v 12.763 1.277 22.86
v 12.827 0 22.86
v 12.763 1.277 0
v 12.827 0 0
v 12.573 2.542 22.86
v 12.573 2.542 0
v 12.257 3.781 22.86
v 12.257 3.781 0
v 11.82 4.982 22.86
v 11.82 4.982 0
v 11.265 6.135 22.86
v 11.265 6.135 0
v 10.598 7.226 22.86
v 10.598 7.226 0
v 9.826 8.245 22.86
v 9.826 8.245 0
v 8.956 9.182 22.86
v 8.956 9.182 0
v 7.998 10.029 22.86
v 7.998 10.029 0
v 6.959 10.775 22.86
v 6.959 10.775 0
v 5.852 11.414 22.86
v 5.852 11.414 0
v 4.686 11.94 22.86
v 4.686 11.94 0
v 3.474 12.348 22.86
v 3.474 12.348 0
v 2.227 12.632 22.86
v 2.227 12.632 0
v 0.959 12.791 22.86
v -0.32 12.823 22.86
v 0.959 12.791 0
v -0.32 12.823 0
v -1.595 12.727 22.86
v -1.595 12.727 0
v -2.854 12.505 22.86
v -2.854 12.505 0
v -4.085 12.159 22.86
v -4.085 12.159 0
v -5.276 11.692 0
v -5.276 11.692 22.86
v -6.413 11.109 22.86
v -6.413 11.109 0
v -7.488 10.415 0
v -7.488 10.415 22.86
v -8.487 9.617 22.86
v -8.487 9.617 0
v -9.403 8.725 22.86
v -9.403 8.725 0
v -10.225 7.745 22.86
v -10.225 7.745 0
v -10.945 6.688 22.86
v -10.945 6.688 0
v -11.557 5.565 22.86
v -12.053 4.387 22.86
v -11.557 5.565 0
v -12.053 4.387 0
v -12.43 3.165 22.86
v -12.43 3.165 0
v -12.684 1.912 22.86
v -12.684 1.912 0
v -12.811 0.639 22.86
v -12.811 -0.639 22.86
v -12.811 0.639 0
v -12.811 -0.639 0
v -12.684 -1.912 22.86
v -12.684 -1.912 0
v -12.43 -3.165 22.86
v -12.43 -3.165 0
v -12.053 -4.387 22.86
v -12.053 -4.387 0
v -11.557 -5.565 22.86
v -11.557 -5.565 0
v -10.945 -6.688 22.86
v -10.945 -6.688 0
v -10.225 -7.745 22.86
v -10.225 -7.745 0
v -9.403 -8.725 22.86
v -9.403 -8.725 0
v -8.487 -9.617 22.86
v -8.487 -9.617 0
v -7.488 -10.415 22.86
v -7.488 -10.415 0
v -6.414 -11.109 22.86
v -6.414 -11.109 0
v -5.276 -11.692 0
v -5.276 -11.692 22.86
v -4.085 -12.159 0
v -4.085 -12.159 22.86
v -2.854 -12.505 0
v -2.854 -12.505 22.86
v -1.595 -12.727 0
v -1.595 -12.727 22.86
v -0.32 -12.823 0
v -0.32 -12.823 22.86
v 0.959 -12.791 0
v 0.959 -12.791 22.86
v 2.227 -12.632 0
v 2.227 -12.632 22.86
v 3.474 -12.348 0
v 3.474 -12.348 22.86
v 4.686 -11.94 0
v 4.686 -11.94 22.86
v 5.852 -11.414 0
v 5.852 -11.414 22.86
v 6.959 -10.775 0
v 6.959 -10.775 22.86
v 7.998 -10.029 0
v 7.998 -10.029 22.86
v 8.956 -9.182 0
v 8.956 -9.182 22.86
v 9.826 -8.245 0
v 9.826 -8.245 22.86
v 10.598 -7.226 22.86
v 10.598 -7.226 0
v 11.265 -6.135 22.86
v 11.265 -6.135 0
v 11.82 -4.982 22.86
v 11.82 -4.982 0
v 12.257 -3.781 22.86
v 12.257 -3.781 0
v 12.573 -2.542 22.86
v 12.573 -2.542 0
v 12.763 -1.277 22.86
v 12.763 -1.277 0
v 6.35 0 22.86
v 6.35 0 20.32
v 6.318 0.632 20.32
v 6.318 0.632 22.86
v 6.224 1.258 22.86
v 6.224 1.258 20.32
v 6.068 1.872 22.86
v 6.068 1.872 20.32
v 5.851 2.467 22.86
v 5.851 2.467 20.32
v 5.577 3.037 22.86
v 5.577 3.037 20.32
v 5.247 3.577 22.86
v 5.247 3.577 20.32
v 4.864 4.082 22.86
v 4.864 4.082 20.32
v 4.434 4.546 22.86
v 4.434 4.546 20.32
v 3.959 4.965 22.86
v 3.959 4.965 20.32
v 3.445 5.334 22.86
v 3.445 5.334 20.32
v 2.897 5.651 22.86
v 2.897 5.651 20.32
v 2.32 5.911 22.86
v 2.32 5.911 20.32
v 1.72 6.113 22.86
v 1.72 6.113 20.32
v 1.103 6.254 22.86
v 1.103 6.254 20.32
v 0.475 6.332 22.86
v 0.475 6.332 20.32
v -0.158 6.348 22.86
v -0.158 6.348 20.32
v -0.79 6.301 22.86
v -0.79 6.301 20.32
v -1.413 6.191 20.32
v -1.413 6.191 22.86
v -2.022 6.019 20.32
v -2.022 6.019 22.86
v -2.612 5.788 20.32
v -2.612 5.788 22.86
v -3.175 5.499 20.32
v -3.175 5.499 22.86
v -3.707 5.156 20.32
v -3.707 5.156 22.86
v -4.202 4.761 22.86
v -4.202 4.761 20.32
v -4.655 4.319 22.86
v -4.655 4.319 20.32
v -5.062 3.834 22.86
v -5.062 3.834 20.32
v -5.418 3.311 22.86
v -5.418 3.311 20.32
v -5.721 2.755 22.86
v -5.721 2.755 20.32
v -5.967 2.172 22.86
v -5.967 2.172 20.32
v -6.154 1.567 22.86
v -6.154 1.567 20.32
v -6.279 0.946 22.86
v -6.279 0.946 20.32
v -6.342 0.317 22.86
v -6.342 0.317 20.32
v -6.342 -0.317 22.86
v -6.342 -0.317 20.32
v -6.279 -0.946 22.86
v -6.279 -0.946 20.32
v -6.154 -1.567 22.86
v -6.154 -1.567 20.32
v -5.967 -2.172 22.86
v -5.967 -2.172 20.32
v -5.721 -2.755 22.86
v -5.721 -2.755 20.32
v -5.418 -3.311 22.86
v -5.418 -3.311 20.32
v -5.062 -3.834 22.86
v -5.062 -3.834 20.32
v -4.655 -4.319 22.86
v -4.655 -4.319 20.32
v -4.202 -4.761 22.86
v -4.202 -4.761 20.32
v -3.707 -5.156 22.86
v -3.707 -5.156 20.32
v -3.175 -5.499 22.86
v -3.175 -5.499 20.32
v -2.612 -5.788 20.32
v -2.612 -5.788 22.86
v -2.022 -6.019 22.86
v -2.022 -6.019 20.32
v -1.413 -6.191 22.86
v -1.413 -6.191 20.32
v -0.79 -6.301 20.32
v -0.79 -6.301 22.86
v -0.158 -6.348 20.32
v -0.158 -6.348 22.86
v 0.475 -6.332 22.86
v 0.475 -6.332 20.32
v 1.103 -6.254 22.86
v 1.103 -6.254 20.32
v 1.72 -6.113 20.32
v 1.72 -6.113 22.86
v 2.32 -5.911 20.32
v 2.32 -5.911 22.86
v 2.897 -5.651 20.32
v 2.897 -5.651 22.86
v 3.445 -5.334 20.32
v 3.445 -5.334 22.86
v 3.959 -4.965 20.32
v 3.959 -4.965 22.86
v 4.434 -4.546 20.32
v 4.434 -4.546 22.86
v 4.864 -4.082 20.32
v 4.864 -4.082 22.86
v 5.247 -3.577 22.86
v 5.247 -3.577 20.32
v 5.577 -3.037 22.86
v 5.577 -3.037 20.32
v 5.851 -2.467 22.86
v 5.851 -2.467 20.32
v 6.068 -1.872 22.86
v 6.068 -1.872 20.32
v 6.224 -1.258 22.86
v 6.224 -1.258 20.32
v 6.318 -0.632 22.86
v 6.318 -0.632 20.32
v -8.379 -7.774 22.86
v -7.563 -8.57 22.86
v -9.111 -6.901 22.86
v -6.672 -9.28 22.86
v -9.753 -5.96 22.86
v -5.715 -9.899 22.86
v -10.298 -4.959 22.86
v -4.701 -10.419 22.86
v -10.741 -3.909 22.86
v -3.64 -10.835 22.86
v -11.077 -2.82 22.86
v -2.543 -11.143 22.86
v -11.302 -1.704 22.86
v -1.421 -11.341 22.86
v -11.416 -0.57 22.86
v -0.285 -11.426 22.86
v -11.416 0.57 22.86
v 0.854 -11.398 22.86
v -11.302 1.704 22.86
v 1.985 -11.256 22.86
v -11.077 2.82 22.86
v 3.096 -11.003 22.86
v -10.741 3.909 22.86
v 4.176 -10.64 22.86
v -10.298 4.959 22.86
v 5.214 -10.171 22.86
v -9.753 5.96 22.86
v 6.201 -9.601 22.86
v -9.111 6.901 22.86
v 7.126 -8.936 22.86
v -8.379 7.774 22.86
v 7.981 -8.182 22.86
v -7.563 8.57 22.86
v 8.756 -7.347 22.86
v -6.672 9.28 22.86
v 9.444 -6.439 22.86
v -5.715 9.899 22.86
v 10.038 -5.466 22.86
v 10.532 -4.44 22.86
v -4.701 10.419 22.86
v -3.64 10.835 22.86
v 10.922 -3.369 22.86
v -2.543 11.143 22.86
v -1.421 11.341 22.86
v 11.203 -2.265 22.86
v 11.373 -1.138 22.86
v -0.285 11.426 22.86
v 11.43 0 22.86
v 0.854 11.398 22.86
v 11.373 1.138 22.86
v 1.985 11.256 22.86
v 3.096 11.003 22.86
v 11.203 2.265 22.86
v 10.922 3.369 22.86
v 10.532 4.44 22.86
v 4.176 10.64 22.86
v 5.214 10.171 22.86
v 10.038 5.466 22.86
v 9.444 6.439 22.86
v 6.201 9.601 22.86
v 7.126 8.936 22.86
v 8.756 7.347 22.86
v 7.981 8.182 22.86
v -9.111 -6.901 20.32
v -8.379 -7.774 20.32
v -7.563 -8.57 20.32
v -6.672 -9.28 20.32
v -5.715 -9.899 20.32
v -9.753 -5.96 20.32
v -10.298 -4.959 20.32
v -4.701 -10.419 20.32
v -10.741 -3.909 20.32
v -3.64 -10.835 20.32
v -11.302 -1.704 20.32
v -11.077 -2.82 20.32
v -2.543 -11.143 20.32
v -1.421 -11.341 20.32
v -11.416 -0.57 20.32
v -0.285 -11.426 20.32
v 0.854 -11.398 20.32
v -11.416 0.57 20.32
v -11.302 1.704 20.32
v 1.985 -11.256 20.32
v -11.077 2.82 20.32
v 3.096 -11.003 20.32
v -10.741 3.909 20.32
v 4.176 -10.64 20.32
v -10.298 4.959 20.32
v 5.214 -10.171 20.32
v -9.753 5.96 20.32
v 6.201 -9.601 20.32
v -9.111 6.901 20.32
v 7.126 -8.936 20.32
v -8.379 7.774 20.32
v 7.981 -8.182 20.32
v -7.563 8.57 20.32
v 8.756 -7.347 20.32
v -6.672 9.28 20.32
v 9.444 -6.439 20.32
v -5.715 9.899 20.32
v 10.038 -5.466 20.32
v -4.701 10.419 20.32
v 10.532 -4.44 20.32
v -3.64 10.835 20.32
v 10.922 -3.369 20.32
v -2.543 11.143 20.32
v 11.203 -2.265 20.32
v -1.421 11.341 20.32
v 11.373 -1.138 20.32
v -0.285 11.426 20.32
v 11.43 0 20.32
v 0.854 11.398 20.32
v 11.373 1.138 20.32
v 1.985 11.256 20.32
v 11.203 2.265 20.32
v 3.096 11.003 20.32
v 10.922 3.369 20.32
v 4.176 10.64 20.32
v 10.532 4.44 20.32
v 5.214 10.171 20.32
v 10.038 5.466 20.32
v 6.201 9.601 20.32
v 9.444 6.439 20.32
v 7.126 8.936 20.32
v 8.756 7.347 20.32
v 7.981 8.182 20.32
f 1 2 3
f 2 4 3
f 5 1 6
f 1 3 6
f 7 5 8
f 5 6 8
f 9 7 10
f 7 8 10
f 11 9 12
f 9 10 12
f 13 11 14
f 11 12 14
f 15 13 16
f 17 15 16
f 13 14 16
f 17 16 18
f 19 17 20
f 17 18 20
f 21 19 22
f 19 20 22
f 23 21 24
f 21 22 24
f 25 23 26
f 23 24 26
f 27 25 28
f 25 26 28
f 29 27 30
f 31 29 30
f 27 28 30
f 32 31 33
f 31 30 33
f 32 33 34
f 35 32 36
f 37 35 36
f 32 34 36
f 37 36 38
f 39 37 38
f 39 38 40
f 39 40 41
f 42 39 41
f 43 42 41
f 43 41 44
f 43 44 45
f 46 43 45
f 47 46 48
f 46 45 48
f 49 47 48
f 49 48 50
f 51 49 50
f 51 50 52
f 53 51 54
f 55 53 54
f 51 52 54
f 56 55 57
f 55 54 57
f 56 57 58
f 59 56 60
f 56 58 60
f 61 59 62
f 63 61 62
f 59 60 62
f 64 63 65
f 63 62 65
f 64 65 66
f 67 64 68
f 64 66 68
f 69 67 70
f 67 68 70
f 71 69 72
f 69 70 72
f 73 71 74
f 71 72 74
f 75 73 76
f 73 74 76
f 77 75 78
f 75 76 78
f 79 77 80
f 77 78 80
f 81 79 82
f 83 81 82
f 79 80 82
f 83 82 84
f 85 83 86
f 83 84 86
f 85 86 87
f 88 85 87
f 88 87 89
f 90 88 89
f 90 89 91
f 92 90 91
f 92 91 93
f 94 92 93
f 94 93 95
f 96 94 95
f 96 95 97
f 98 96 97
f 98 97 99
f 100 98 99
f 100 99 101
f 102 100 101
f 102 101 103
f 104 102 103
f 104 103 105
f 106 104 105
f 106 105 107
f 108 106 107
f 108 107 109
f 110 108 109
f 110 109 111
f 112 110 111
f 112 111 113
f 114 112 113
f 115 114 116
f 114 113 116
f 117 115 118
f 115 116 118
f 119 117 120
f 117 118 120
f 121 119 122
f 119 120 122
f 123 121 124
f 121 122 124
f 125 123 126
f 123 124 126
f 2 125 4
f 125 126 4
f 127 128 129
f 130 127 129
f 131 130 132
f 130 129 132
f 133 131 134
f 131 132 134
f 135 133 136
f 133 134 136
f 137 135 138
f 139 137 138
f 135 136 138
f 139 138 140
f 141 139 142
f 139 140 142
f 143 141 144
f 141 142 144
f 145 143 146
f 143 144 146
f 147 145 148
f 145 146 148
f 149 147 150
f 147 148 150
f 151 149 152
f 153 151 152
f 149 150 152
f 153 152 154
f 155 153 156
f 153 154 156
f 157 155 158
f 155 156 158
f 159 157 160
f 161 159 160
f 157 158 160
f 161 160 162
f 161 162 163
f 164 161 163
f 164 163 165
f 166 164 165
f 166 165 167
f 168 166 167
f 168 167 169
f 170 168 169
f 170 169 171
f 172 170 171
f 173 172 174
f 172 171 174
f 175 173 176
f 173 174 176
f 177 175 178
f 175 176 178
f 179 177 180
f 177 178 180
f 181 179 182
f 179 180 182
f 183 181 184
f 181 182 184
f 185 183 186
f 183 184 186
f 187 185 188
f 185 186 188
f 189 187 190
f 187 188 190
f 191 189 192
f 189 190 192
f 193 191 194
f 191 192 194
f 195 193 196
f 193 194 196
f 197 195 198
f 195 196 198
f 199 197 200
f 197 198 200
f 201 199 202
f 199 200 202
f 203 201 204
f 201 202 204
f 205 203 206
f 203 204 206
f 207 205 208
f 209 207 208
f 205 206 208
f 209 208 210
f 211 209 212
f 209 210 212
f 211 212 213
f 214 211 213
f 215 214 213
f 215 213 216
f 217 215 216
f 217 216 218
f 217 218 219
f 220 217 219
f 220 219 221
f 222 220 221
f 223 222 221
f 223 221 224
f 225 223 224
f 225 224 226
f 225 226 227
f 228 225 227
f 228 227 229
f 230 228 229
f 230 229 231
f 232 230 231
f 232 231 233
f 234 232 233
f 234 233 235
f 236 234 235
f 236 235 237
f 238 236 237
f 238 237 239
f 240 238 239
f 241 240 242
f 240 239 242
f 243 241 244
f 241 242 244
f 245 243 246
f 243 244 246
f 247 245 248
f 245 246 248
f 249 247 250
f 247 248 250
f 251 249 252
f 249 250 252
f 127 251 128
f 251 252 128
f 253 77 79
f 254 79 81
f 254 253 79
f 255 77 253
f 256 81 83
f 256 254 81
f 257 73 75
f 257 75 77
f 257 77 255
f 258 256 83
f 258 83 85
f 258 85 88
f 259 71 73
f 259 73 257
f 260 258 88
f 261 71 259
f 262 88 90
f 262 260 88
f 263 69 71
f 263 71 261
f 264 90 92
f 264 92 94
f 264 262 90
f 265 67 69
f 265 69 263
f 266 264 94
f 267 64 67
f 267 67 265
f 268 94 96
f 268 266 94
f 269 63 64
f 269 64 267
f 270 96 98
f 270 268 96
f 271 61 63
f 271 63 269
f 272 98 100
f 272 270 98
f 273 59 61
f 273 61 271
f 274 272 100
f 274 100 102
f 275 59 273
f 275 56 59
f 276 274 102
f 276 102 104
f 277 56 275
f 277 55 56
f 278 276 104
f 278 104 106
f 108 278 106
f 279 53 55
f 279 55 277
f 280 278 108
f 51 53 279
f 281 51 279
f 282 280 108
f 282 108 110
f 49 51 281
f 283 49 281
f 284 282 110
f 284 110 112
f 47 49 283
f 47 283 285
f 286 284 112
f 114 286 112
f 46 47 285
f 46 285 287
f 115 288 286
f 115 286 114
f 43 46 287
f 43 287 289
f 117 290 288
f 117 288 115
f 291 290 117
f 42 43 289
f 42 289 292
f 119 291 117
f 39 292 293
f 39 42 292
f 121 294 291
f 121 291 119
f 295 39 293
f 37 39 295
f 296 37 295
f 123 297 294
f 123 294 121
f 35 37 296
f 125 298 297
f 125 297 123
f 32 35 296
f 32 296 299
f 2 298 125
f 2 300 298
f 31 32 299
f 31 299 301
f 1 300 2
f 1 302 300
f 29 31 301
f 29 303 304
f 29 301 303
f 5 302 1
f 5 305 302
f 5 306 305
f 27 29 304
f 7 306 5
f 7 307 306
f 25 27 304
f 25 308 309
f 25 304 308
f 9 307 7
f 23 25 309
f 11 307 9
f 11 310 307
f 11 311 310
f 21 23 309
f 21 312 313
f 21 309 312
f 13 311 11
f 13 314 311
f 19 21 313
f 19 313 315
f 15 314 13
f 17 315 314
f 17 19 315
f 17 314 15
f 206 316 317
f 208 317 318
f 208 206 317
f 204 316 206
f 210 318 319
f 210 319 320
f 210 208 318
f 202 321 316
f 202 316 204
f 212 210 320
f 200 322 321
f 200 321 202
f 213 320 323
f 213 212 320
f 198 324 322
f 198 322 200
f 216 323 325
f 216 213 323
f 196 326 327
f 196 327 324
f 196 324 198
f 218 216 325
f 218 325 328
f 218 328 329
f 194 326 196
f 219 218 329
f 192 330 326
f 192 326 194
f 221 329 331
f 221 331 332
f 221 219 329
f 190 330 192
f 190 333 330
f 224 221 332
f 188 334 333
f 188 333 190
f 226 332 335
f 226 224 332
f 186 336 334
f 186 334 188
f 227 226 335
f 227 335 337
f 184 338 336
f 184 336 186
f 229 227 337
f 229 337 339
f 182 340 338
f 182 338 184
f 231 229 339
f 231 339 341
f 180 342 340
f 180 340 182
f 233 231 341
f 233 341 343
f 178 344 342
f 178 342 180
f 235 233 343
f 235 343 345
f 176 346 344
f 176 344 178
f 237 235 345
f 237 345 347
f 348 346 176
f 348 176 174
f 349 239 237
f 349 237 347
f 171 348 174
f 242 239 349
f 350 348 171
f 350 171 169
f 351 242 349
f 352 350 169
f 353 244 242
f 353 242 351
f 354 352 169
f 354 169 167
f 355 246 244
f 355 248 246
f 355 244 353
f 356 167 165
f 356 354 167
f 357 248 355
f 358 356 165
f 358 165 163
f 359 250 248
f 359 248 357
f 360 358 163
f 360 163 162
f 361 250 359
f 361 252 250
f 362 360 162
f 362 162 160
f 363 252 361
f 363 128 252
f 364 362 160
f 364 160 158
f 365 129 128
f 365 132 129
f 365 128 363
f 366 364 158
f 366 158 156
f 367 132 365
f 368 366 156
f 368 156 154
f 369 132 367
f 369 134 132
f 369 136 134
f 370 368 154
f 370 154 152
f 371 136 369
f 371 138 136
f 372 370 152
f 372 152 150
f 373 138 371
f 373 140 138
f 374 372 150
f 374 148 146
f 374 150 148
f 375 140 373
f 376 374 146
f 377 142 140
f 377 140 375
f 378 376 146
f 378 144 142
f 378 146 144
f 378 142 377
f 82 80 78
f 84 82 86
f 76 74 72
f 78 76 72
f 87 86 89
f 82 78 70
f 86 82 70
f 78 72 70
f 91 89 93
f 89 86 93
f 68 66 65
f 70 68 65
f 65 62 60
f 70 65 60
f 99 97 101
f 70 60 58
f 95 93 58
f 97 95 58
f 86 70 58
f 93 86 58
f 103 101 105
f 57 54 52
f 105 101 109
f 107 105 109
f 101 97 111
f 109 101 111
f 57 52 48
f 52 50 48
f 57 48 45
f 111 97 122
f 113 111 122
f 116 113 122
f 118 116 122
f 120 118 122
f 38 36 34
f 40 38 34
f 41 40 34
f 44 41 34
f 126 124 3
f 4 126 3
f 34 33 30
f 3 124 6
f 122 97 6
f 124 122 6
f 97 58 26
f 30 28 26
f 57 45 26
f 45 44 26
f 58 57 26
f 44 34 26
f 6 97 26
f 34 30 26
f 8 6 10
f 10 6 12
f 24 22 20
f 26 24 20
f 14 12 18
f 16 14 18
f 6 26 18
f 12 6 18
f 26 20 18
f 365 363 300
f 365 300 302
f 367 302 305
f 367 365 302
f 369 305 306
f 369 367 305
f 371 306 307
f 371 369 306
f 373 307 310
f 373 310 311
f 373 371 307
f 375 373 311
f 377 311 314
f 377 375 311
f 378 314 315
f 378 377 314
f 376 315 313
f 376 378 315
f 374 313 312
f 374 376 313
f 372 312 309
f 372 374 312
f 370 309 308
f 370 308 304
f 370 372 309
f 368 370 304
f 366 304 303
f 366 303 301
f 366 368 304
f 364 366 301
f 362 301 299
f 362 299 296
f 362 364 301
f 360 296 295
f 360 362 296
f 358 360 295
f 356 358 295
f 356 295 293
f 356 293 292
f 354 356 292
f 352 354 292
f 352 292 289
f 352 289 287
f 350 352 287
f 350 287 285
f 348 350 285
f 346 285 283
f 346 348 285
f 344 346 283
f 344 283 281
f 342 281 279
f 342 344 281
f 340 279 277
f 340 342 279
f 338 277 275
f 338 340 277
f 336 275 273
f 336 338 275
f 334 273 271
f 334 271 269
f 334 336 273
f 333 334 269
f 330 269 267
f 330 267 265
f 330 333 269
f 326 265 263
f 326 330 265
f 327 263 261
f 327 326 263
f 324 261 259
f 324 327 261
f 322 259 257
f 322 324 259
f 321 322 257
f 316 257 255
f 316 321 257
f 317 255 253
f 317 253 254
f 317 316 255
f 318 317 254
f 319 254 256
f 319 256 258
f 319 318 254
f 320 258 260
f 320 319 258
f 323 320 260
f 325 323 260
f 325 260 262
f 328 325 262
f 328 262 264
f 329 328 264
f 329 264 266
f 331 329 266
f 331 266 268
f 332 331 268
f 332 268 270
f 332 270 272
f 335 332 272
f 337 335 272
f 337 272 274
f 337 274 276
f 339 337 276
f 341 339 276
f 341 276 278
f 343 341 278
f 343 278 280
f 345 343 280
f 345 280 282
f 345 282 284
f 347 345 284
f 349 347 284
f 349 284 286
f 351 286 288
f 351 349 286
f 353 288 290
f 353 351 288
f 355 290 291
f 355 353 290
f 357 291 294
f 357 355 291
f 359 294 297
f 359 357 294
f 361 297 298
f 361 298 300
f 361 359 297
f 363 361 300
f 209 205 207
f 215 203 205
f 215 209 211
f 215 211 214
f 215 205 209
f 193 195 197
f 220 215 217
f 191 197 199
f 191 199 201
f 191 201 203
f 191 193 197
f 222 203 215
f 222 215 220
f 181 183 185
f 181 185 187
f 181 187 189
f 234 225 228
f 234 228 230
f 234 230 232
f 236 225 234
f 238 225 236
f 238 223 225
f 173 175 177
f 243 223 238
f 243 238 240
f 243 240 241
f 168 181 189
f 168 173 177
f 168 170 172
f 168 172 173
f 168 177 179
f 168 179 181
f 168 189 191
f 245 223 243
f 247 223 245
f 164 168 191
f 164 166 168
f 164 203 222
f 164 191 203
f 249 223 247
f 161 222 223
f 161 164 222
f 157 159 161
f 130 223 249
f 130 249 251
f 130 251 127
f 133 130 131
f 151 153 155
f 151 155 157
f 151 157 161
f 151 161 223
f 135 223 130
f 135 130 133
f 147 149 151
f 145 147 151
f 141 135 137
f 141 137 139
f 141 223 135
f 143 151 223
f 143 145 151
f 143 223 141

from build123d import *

# Parameters (mm, degrees)
SKETCH1_R           = 12.827
BOSS_EXTRUDE1_DEPTH = 20.32
SKETCH2_R           = 12.827
SKETCH2_R_2         = 11.43
SKETCH2_R_3         = 6.35
BOSS_EXTRUDE2_DEPTH = 2.54


with BuildPart() as part:
    # Sketch1 → Boss-Extrude1 (new body)
    with BuildSketch(Plane.XY):
        Circle(SKETCH1_R)
    extrude(amount=BOSS_EXTRUDE1_DEPTH)

    # Sketch2 → Boss-Extrude2 (add)
    # profile 1 of 2: a face of its own
    with BuildSketch(Plane.XY.offset(20.32)):
        Circle(SKETCH2_R)
        Circle(SKETCH2_R_2, mode=Mode.SUBTRACT)
    # profile 2 of 2: a face of its own
    with BuildSketch(Plane.XY.offset(20.32)):
        Circle(SKETCH2_R_3)
    extrude(amount=BOSS_EXTRUDE2_DEPTH)


solid = part.part
